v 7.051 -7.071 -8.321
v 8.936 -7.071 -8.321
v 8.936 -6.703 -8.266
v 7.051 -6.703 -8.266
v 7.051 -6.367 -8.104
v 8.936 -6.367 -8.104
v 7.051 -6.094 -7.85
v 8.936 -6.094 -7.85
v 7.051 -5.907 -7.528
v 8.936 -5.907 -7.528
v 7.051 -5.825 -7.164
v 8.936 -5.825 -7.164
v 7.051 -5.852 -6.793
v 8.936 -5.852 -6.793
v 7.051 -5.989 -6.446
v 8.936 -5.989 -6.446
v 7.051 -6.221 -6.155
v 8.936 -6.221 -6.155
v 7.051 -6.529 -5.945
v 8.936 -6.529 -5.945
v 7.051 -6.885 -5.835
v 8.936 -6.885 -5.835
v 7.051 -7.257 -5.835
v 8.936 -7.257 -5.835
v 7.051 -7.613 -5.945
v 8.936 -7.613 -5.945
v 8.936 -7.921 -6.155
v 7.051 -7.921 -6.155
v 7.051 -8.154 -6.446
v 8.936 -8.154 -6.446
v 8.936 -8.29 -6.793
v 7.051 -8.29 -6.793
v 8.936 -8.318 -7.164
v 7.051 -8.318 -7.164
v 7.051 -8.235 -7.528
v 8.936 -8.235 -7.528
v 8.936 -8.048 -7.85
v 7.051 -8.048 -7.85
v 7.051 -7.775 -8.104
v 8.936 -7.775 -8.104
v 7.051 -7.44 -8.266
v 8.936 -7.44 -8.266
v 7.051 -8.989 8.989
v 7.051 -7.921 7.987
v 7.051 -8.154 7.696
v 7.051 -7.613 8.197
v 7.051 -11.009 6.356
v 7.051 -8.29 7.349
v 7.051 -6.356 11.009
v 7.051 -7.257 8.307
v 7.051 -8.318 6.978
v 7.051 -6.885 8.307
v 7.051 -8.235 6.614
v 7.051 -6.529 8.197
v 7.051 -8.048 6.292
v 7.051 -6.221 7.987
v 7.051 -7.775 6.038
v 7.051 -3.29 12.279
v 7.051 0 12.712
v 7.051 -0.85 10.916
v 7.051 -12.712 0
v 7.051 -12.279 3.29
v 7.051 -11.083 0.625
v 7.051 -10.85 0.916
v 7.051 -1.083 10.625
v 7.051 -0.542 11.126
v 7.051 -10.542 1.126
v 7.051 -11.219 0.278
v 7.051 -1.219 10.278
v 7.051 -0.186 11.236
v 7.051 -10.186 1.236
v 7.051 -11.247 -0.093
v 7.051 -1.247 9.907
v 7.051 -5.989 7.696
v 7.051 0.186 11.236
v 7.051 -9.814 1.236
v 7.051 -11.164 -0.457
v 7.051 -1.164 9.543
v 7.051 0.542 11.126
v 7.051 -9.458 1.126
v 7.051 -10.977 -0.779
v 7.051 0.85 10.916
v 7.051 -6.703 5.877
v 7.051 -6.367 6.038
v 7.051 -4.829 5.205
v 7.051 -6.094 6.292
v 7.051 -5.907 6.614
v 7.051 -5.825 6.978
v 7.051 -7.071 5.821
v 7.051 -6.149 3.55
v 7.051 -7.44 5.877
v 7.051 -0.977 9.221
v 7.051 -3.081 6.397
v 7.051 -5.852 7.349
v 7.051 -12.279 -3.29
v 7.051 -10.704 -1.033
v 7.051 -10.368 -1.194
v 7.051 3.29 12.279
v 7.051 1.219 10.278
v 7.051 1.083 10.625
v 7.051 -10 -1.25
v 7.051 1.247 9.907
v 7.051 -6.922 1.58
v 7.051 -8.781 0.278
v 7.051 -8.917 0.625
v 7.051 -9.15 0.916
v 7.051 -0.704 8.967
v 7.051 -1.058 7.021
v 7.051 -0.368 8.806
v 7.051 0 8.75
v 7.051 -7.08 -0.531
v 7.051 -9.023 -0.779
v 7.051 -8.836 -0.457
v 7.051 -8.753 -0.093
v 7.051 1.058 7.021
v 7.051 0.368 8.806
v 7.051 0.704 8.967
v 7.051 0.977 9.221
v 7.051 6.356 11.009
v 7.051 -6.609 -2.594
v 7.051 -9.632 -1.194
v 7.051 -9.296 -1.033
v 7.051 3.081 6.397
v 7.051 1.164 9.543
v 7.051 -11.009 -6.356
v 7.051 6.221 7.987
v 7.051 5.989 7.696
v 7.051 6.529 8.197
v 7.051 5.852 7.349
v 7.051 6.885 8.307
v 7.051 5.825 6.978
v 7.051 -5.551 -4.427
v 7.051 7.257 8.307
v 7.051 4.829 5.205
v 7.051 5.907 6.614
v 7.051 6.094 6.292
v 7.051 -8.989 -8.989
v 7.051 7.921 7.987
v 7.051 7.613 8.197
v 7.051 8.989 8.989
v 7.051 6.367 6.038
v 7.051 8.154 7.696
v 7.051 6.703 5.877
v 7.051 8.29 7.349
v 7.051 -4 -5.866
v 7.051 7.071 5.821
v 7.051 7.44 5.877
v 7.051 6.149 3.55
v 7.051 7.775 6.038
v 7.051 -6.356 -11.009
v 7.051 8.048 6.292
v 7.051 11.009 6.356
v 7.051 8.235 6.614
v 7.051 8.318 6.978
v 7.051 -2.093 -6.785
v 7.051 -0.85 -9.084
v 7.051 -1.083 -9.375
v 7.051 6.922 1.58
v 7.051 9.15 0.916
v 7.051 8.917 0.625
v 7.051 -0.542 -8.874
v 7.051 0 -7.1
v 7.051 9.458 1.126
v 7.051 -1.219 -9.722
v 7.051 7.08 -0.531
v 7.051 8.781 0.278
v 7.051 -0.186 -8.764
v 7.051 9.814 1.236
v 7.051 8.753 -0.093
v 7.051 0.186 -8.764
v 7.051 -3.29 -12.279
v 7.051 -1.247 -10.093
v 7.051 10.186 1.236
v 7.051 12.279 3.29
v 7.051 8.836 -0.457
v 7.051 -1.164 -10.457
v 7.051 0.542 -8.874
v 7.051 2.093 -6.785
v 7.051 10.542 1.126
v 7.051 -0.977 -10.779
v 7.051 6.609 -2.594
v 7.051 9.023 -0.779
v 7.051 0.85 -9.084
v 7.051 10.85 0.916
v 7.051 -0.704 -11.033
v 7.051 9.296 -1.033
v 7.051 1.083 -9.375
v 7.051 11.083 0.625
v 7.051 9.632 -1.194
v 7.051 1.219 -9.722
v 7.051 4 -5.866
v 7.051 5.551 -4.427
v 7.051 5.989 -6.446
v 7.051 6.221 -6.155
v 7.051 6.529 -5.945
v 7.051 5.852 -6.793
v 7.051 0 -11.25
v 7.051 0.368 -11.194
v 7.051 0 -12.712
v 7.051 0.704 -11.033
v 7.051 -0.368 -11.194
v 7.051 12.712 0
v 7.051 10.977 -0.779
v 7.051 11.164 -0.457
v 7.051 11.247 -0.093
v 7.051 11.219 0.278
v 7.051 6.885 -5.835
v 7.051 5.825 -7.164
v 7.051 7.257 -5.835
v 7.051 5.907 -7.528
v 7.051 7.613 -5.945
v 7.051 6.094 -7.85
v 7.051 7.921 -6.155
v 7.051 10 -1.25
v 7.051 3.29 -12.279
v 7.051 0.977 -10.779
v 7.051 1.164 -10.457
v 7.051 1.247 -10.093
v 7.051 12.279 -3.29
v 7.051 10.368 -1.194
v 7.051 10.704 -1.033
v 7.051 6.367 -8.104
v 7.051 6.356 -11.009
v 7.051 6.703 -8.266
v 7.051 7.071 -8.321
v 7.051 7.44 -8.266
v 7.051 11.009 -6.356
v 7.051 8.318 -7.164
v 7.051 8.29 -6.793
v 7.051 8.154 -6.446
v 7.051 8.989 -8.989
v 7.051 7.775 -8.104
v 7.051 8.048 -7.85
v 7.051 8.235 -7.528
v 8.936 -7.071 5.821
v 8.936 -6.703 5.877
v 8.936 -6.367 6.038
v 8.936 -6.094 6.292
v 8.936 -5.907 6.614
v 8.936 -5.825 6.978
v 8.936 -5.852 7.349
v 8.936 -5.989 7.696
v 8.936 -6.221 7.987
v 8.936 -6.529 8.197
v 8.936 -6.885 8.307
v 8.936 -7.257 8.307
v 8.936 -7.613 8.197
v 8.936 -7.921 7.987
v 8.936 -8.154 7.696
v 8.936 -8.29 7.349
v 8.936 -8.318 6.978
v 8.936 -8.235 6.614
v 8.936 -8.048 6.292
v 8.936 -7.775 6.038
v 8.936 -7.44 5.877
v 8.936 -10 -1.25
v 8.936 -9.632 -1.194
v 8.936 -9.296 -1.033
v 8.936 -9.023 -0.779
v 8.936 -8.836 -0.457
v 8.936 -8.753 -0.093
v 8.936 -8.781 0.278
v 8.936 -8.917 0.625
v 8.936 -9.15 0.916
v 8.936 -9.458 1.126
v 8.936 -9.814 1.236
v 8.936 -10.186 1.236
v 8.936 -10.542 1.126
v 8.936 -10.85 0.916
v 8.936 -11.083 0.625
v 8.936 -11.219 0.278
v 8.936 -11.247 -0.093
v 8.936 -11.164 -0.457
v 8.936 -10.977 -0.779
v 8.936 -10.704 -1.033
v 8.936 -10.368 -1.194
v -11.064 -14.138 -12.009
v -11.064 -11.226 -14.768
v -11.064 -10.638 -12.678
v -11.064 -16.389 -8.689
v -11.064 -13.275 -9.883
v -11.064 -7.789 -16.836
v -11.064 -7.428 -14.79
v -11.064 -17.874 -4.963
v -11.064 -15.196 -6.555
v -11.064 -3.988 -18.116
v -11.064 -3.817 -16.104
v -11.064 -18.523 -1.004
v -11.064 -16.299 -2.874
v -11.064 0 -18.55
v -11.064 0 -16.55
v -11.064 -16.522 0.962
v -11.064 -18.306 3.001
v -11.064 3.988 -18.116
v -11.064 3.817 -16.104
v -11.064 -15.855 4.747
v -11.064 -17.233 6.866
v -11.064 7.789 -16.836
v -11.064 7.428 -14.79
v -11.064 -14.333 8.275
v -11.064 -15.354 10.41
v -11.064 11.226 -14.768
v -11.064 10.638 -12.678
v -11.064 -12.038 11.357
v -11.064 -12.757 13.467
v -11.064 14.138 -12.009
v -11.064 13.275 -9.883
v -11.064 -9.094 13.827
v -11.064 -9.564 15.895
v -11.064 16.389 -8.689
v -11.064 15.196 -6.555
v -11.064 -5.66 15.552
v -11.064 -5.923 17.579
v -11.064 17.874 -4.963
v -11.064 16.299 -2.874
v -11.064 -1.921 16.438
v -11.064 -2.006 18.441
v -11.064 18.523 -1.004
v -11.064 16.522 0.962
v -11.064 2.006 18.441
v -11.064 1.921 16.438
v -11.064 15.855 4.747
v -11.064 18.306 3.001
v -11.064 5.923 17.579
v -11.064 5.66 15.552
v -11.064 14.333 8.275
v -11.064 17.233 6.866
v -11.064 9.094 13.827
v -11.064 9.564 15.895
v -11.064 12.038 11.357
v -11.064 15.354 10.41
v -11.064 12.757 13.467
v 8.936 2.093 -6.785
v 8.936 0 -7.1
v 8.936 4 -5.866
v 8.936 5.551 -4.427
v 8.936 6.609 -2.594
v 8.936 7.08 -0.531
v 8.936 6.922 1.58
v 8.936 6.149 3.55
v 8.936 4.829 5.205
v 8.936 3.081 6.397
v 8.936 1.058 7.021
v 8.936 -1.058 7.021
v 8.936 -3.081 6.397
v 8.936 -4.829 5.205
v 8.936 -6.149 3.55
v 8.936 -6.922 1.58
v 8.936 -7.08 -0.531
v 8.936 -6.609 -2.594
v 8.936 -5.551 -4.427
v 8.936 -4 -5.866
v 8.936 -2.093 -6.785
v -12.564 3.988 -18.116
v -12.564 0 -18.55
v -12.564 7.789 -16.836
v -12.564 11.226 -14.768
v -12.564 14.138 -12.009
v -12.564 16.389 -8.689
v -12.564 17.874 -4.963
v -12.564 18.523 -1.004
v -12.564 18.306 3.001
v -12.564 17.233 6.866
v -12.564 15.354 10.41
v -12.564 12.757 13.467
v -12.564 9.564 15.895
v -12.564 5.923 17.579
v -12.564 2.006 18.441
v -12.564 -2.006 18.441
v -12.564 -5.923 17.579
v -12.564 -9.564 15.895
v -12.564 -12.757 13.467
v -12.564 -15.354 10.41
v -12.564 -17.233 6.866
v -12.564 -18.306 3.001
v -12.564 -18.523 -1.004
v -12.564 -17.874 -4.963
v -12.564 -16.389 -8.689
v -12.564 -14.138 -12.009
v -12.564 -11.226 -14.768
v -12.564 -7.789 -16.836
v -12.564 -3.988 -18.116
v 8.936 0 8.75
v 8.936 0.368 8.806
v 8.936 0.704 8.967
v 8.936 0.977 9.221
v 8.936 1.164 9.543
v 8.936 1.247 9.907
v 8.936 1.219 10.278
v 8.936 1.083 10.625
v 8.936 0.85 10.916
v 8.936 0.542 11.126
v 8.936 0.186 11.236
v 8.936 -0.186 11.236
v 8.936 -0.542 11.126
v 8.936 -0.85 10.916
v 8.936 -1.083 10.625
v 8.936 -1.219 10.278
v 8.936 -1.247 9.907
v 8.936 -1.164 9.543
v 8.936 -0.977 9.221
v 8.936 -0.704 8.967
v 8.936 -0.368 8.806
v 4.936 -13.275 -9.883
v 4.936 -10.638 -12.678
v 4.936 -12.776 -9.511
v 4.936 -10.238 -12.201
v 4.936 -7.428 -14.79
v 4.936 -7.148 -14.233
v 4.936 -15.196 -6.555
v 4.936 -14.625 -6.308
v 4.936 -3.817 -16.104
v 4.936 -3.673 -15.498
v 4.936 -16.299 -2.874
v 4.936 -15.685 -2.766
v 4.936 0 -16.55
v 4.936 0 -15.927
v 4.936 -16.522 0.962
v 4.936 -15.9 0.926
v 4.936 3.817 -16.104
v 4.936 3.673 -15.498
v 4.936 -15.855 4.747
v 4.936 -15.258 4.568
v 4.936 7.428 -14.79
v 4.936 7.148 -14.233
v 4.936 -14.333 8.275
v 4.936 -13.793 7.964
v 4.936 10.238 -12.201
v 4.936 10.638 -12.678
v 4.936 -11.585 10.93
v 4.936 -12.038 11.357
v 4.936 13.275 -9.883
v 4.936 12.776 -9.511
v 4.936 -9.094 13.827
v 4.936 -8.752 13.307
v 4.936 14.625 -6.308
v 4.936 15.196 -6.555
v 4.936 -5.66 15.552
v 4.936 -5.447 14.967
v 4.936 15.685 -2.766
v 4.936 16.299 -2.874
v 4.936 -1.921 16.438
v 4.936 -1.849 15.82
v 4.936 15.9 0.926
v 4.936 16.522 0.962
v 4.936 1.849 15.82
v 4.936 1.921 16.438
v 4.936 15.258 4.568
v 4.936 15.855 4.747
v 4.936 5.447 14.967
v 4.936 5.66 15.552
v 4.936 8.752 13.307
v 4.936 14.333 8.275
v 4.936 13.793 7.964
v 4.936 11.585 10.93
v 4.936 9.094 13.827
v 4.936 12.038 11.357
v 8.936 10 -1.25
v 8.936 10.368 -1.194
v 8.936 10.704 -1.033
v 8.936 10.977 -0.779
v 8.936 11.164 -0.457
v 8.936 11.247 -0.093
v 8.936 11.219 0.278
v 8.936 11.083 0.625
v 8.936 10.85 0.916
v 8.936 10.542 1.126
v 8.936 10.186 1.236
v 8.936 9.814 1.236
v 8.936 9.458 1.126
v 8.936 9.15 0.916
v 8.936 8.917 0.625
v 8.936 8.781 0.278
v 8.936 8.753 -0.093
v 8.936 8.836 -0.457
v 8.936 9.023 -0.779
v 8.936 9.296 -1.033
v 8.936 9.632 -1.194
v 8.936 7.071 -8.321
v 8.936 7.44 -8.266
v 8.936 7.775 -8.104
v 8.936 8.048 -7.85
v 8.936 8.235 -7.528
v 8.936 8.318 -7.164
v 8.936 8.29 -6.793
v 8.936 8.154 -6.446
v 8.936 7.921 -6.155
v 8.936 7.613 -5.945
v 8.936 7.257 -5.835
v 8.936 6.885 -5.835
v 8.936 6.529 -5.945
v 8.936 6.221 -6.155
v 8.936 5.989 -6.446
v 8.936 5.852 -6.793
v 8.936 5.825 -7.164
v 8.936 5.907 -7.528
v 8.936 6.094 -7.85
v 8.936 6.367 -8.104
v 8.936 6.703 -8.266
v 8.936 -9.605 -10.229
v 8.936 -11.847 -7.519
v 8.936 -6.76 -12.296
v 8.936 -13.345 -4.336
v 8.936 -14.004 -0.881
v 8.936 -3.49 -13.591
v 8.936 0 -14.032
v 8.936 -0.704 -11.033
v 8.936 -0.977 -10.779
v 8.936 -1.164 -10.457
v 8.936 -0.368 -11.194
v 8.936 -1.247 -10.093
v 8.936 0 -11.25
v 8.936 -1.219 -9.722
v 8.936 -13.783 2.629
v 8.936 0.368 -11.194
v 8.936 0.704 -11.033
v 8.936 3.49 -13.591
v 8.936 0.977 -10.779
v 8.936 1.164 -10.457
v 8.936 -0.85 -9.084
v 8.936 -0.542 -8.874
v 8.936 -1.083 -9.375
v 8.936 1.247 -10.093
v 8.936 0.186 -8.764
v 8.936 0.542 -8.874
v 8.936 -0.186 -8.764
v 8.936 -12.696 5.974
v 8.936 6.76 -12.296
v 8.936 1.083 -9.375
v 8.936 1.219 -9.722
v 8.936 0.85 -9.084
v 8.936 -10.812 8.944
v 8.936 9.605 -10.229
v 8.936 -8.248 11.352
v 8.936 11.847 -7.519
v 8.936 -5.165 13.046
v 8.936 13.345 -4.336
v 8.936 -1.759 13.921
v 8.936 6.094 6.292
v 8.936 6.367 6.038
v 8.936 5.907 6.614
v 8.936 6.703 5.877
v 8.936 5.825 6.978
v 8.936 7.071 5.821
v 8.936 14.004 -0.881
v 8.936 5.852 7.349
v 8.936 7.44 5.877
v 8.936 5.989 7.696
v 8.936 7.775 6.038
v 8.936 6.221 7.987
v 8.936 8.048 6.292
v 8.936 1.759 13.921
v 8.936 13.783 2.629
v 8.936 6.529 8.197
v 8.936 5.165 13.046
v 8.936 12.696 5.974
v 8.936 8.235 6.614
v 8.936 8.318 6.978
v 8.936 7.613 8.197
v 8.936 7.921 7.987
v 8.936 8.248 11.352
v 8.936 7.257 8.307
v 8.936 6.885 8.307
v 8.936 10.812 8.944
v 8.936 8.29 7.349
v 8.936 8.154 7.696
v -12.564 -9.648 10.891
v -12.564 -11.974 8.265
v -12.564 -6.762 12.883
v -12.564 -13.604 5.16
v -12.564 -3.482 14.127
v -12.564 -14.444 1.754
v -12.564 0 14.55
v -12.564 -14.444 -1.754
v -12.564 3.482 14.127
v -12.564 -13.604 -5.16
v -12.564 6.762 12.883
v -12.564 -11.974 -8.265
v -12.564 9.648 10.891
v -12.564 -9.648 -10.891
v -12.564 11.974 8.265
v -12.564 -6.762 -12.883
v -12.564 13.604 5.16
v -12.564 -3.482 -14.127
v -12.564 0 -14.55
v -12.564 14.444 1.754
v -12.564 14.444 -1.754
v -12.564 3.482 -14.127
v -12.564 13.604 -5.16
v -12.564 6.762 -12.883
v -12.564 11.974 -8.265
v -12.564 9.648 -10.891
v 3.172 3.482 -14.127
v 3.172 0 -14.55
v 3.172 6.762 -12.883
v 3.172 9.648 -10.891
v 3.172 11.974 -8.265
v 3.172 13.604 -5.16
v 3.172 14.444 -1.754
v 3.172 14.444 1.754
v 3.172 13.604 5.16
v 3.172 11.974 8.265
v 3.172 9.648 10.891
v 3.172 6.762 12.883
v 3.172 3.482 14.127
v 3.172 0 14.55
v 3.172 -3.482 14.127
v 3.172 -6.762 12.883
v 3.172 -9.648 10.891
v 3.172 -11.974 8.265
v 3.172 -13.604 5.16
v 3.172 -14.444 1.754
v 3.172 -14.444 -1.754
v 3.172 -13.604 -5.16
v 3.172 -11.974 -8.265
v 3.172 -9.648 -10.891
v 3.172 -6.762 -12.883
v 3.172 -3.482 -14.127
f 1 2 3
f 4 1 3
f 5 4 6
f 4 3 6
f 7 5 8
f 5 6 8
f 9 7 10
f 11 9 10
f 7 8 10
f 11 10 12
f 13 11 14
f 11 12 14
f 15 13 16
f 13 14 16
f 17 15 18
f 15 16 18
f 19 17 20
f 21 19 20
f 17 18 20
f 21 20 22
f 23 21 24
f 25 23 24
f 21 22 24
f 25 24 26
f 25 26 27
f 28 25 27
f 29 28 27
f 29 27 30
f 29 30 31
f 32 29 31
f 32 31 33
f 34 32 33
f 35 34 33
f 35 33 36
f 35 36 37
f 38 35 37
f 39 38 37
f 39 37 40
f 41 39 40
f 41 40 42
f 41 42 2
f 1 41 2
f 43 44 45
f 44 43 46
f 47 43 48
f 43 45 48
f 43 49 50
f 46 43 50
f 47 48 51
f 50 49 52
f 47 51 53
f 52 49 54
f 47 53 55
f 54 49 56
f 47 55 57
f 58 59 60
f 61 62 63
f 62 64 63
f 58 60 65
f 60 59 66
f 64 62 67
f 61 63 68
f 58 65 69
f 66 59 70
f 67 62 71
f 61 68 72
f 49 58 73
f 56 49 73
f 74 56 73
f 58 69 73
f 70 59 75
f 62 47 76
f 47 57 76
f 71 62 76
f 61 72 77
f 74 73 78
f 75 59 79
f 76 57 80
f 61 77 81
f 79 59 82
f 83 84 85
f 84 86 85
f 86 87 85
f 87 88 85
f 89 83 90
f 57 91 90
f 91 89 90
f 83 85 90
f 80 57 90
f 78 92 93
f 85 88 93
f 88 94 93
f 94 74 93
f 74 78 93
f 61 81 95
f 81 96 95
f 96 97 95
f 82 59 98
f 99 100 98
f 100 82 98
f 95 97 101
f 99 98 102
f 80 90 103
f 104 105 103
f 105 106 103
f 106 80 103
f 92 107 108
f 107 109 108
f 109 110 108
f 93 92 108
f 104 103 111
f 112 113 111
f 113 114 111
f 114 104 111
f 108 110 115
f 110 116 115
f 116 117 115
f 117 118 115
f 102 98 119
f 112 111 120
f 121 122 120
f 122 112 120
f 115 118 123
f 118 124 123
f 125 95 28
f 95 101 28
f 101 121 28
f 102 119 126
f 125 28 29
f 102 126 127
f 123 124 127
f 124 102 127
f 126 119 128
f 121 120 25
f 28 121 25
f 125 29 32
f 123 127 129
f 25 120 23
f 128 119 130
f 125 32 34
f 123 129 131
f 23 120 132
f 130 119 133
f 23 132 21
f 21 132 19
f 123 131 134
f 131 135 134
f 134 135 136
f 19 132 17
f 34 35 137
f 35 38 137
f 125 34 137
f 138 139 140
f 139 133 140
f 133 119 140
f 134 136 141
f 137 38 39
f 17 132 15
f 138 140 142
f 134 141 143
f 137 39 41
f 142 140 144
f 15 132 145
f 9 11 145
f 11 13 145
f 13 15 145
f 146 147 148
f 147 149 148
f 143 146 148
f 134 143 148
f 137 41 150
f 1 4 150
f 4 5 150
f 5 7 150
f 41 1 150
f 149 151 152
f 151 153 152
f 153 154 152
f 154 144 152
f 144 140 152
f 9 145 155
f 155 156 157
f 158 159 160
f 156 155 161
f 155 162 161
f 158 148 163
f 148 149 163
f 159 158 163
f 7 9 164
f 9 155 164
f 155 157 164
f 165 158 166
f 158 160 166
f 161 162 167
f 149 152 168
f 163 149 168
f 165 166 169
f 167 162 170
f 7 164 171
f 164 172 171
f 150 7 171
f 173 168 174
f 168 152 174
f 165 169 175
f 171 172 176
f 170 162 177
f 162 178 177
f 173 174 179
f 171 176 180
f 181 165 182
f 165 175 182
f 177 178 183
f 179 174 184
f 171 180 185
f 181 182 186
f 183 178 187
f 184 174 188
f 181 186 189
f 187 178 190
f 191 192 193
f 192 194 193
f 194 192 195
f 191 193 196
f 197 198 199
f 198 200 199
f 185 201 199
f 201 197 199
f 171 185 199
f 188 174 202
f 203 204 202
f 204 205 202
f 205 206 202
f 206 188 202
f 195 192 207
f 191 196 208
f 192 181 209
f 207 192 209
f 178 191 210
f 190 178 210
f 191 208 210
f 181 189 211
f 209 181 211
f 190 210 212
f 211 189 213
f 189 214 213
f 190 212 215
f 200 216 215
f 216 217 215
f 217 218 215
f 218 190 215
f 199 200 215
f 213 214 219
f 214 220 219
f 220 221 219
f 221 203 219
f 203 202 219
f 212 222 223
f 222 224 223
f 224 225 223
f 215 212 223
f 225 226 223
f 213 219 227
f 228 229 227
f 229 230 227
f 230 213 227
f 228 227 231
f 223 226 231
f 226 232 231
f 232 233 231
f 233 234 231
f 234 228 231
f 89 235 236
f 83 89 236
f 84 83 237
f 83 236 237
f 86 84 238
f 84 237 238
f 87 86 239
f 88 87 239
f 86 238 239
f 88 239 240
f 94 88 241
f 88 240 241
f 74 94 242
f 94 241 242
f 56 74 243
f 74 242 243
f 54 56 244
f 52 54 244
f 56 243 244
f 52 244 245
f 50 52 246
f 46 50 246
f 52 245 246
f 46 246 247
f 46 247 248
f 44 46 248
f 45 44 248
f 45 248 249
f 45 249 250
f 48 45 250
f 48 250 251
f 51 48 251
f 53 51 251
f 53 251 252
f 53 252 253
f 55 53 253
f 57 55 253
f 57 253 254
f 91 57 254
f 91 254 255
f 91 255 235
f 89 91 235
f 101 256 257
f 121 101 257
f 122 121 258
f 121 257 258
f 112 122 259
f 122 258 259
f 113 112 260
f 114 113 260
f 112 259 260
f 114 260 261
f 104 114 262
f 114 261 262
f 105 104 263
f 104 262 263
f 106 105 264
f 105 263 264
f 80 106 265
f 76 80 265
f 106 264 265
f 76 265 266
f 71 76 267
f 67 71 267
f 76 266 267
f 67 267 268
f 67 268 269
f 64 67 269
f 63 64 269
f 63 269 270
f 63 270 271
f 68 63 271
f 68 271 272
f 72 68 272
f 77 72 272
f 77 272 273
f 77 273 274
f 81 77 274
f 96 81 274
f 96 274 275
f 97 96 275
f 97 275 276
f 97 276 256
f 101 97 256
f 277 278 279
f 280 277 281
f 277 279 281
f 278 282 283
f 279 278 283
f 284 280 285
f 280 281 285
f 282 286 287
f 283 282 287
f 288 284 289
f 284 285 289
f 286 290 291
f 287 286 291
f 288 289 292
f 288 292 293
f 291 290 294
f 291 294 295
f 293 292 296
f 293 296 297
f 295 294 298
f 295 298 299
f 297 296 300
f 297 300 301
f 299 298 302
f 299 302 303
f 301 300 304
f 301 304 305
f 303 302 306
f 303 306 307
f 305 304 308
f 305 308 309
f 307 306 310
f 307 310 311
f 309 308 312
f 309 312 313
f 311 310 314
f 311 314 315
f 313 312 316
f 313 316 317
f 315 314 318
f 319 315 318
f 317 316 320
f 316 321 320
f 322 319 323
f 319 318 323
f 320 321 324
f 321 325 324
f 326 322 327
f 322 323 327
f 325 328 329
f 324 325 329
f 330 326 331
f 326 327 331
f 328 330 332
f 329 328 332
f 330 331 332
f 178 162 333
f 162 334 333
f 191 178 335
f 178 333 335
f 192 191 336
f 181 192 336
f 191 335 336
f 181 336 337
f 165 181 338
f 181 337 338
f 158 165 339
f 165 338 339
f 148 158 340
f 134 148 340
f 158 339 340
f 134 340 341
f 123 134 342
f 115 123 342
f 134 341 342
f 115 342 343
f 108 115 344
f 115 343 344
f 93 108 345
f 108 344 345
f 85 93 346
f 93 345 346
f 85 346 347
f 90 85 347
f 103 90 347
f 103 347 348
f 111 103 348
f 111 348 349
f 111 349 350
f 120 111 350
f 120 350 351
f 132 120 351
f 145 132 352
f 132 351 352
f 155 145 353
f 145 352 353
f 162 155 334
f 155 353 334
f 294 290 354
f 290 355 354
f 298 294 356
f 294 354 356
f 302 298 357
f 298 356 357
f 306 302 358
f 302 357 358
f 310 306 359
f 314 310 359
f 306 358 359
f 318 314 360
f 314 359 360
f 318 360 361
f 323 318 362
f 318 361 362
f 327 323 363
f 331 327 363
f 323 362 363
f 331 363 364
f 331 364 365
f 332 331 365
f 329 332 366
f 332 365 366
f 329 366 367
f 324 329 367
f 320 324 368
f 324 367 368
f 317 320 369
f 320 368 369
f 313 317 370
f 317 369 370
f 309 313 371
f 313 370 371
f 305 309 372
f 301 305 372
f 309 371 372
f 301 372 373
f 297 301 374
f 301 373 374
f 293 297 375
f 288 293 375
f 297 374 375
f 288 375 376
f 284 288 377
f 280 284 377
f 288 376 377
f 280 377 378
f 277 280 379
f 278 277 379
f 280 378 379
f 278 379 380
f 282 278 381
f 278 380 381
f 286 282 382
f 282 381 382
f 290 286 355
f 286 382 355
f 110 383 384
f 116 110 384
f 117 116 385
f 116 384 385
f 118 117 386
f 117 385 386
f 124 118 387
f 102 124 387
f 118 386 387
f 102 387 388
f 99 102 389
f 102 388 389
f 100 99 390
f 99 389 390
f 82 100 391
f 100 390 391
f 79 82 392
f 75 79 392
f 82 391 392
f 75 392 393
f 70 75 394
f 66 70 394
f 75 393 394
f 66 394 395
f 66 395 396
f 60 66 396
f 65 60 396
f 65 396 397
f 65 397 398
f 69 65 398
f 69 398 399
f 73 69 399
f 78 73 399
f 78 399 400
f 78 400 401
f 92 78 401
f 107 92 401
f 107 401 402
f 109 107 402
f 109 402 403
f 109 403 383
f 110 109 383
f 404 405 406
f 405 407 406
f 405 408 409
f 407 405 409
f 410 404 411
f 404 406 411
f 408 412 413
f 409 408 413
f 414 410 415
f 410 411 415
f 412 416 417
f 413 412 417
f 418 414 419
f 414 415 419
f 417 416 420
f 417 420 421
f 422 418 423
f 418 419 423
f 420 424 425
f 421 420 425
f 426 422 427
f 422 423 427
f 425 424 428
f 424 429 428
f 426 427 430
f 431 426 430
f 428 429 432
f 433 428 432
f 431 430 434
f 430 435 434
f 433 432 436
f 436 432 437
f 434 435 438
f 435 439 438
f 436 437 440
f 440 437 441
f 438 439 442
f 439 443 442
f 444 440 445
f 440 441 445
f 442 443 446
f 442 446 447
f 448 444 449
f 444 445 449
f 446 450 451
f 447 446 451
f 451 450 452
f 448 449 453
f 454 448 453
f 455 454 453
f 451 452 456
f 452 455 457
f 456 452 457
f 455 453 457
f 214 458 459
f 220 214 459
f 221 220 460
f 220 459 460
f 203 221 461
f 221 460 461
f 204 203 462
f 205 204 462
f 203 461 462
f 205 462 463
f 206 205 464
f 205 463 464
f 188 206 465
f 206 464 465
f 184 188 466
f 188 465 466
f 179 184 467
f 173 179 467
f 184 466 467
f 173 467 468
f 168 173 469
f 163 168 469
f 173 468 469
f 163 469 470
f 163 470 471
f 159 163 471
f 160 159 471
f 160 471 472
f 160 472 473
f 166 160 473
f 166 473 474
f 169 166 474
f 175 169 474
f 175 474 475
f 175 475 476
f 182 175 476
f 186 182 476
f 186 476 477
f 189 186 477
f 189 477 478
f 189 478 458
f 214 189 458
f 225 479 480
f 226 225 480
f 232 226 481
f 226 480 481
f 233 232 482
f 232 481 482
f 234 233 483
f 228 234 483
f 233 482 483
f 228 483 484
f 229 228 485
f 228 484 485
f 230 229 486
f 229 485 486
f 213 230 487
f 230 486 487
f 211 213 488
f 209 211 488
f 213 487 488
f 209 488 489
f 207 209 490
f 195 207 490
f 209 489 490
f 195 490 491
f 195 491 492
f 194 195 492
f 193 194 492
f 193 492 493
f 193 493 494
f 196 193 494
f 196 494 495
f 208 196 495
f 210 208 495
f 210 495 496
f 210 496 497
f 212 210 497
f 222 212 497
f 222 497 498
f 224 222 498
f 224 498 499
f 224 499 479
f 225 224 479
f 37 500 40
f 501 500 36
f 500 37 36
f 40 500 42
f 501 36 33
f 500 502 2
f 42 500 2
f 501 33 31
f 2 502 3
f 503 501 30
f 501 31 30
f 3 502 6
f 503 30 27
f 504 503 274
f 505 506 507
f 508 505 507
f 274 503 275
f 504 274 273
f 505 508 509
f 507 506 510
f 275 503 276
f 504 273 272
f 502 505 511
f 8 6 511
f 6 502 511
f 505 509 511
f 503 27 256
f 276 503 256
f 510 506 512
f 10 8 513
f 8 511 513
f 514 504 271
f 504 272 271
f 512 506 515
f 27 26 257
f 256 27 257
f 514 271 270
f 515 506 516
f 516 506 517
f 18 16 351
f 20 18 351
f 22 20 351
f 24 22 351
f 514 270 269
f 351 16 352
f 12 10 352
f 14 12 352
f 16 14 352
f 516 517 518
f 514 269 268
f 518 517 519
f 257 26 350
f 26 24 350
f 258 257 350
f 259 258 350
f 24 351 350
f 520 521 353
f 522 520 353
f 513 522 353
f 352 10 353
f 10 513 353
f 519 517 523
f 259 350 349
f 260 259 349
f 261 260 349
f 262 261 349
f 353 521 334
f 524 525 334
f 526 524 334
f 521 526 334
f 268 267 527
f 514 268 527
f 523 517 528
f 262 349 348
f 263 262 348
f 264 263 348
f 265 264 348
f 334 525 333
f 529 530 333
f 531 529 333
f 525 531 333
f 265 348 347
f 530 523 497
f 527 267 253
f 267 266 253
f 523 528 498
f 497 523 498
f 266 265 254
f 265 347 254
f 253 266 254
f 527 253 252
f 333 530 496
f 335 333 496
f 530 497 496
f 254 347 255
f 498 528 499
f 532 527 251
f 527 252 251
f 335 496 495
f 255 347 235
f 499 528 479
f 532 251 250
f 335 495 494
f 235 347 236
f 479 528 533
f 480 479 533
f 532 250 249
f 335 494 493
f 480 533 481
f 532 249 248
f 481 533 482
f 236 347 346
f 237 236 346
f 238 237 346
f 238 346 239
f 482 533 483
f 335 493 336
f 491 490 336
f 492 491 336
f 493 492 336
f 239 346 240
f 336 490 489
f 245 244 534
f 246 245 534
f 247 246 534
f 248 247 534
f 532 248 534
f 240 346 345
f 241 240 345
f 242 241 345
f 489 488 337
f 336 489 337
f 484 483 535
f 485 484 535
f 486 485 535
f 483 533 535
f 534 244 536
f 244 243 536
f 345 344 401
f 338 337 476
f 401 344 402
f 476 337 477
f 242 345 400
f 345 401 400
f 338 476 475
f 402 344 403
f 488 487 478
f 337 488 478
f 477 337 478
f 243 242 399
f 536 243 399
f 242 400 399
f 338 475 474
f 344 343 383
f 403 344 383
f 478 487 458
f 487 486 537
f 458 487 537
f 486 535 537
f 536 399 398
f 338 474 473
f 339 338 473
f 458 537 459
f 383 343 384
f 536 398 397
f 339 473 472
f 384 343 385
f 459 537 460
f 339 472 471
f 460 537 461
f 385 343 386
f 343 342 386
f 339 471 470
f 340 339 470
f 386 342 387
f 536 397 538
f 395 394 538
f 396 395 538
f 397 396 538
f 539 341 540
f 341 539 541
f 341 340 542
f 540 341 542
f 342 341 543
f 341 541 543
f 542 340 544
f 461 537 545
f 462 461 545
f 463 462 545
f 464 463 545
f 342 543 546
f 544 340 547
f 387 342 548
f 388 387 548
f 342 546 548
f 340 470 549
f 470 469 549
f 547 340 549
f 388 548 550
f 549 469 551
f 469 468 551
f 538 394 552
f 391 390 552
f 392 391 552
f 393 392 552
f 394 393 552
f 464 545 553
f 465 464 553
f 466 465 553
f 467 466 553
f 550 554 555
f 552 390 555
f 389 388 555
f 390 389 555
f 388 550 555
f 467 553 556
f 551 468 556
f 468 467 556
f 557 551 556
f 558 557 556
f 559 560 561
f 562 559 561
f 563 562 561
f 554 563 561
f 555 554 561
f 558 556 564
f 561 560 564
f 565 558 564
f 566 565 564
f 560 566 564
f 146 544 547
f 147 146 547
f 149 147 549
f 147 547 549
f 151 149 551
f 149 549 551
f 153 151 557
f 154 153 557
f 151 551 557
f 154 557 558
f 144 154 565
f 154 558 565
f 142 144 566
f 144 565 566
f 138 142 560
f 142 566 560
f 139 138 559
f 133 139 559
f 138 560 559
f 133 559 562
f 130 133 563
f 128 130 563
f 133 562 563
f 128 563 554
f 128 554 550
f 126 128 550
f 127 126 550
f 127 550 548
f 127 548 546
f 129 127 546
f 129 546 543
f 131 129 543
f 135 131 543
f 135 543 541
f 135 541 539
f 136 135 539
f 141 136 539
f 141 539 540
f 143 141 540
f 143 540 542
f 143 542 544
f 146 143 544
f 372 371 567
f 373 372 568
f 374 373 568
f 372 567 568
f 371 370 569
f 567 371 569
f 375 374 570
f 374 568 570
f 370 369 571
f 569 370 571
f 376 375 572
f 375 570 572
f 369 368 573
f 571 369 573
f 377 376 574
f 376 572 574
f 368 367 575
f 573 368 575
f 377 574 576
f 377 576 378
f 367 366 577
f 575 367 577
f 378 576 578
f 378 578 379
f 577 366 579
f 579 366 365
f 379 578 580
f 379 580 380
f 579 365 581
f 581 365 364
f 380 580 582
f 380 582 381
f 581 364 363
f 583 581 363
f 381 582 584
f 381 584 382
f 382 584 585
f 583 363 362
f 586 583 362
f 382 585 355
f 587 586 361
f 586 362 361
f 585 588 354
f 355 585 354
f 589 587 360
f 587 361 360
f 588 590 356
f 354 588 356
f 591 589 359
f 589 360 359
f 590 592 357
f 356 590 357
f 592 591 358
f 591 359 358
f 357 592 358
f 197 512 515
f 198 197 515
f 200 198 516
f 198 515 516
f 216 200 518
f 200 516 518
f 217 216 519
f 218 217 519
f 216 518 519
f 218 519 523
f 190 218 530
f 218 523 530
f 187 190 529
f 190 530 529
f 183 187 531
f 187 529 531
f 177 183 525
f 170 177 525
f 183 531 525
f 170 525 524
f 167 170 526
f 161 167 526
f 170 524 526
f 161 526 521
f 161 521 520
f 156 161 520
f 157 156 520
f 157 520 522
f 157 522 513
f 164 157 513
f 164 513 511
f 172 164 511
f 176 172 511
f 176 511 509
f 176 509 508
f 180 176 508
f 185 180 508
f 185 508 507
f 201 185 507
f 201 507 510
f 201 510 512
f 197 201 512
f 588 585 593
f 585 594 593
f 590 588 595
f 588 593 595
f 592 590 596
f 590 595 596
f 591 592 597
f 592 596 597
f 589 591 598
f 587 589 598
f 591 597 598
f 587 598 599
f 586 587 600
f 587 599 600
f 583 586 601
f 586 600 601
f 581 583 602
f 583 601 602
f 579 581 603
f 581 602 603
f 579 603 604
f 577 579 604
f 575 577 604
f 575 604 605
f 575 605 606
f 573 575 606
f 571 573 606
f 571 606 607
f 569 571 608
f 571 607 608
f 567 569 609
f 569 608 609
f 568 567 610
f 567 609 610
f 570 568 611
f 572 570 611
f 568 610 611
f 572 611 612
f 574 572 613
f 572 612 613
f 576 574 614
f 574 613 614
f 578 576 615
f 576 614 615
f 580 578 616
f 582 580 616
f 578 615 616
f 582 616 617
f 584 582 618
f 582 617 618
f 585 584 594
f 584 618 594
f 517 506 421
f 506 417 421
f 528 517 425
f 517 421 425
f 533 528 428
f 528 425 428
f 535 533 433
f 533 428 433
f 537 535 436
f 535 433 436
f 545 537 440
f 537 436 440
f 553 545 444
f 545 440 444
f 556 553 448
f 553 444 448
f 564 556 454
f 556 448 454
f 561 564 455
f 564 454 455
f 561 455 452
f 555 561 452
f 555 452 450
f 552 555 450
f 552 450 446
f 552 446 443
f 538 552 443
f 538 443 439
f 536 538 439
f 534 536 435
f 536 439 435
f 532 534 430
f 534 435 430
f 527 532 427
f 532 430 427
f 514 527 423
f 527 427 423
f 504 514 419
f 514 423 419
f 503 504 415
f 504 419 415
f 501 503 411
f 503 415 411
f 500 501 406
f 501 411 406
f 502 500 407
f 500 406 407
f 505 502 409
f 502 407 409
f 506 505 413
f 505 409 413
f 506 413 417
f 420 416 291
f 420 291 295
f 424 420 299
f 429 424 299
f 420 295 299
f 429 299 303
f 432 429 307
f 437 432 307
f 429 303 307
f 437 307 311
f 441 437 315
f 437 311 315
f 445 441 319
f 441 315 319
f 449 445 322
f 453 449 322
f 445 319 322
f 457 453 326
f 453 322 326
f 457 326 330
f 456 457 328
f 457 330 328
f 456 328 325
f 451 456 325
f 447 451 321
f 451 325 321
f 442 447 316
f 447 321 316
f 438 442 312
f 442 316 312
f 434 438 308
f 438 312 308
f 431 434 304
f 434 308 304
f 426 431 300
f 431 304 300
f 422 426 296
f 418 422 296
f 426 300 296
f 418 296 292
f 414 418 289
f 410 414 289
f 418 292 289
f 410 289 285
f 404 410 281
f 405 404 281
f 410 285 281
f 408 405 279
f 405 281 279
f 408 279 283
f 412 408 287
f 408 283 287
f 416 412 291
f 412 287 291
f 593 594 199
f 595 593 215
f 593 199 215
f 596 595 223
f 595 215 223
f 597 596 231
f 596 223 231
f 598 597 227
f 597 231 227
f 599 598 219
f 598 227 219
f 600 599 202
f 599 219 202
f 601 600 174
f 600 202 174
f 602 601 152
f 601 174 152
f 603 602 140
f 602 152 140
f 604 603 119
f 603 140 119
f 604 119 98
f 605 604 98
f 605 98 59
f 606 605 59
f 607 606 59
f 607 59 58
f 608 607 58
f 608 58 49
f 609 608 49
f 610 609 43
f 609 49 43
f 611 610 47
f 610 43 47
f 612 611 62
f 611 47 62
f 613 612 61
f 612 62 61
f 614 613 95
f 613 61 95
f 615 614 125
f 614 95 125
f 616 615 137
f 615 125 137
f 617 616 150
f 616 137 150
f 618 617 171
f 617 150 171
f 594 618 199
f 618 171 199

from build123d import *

# Parameters (mm, degrees)
SKETCH2_R          = 1.25
CUT_EXTRUDE1_DEPTH = 5


with BuildPart() as part:
    # Sketch1 → Revolve1 (revolve)
    with BuildSketch(Plane(origin=(0, 0, 0), x_dir=(1, 0, 0), z_dir=(0, 1, 0))):
        Polygon((8.936305636, 8.625), (8.936305636, 14.031614125), (4.936305636, 15.92728698), (4.936305636, 16.55), (-11.063694364, 16.55), (-11.063694364, 18.55), (-12.563694364, 18.55), (-12.563694364, 16.55), (-12.563694364, 14.55), (3.172405145, 14.55), (7.050606918, 12.712049543), (7.050606918, 7.1), (8.936305636, 7.1), align=None)
    revolve(axis=Axis((-37.278866169, 0, 0), (1, 0, 0)))

    # Sketch2 → Cut-Extrude1 (cut)
    with BuildSketch(Plane(origin=(8.936305636, 0, 0), x_dir=(0, 0, -1), z_dir=(1, 0, 0))):
        with Locations((0, 10)):
            Circle(SKETCH2_R)
        with Locations((7.071067812, 7.071067812)):
            Circle(SKETCH2_R)
        with Locations((10, 0)):
            Circle(SKETCH2_R)
        with Locations((7.071067812, -7.071067812)):
            Circle(SKETCH2_R)
        with Locations((0, -10)):
            Circle(SKETCH2_R)
        with Locations((-7.071067812, -7.071067812)):
            Circle(SKETCH2_R)
        with Locations((-10, 0)):
            Circle(SKETCH2_R)
        with Locations((-7.071067812, 7.071067812)):
            Circle(SKETCH2_R)
    extrude(amount=-CUT_EXTRUDE1_DEPTH, mode=Mode.SUBTRACT)


solid = part.part
